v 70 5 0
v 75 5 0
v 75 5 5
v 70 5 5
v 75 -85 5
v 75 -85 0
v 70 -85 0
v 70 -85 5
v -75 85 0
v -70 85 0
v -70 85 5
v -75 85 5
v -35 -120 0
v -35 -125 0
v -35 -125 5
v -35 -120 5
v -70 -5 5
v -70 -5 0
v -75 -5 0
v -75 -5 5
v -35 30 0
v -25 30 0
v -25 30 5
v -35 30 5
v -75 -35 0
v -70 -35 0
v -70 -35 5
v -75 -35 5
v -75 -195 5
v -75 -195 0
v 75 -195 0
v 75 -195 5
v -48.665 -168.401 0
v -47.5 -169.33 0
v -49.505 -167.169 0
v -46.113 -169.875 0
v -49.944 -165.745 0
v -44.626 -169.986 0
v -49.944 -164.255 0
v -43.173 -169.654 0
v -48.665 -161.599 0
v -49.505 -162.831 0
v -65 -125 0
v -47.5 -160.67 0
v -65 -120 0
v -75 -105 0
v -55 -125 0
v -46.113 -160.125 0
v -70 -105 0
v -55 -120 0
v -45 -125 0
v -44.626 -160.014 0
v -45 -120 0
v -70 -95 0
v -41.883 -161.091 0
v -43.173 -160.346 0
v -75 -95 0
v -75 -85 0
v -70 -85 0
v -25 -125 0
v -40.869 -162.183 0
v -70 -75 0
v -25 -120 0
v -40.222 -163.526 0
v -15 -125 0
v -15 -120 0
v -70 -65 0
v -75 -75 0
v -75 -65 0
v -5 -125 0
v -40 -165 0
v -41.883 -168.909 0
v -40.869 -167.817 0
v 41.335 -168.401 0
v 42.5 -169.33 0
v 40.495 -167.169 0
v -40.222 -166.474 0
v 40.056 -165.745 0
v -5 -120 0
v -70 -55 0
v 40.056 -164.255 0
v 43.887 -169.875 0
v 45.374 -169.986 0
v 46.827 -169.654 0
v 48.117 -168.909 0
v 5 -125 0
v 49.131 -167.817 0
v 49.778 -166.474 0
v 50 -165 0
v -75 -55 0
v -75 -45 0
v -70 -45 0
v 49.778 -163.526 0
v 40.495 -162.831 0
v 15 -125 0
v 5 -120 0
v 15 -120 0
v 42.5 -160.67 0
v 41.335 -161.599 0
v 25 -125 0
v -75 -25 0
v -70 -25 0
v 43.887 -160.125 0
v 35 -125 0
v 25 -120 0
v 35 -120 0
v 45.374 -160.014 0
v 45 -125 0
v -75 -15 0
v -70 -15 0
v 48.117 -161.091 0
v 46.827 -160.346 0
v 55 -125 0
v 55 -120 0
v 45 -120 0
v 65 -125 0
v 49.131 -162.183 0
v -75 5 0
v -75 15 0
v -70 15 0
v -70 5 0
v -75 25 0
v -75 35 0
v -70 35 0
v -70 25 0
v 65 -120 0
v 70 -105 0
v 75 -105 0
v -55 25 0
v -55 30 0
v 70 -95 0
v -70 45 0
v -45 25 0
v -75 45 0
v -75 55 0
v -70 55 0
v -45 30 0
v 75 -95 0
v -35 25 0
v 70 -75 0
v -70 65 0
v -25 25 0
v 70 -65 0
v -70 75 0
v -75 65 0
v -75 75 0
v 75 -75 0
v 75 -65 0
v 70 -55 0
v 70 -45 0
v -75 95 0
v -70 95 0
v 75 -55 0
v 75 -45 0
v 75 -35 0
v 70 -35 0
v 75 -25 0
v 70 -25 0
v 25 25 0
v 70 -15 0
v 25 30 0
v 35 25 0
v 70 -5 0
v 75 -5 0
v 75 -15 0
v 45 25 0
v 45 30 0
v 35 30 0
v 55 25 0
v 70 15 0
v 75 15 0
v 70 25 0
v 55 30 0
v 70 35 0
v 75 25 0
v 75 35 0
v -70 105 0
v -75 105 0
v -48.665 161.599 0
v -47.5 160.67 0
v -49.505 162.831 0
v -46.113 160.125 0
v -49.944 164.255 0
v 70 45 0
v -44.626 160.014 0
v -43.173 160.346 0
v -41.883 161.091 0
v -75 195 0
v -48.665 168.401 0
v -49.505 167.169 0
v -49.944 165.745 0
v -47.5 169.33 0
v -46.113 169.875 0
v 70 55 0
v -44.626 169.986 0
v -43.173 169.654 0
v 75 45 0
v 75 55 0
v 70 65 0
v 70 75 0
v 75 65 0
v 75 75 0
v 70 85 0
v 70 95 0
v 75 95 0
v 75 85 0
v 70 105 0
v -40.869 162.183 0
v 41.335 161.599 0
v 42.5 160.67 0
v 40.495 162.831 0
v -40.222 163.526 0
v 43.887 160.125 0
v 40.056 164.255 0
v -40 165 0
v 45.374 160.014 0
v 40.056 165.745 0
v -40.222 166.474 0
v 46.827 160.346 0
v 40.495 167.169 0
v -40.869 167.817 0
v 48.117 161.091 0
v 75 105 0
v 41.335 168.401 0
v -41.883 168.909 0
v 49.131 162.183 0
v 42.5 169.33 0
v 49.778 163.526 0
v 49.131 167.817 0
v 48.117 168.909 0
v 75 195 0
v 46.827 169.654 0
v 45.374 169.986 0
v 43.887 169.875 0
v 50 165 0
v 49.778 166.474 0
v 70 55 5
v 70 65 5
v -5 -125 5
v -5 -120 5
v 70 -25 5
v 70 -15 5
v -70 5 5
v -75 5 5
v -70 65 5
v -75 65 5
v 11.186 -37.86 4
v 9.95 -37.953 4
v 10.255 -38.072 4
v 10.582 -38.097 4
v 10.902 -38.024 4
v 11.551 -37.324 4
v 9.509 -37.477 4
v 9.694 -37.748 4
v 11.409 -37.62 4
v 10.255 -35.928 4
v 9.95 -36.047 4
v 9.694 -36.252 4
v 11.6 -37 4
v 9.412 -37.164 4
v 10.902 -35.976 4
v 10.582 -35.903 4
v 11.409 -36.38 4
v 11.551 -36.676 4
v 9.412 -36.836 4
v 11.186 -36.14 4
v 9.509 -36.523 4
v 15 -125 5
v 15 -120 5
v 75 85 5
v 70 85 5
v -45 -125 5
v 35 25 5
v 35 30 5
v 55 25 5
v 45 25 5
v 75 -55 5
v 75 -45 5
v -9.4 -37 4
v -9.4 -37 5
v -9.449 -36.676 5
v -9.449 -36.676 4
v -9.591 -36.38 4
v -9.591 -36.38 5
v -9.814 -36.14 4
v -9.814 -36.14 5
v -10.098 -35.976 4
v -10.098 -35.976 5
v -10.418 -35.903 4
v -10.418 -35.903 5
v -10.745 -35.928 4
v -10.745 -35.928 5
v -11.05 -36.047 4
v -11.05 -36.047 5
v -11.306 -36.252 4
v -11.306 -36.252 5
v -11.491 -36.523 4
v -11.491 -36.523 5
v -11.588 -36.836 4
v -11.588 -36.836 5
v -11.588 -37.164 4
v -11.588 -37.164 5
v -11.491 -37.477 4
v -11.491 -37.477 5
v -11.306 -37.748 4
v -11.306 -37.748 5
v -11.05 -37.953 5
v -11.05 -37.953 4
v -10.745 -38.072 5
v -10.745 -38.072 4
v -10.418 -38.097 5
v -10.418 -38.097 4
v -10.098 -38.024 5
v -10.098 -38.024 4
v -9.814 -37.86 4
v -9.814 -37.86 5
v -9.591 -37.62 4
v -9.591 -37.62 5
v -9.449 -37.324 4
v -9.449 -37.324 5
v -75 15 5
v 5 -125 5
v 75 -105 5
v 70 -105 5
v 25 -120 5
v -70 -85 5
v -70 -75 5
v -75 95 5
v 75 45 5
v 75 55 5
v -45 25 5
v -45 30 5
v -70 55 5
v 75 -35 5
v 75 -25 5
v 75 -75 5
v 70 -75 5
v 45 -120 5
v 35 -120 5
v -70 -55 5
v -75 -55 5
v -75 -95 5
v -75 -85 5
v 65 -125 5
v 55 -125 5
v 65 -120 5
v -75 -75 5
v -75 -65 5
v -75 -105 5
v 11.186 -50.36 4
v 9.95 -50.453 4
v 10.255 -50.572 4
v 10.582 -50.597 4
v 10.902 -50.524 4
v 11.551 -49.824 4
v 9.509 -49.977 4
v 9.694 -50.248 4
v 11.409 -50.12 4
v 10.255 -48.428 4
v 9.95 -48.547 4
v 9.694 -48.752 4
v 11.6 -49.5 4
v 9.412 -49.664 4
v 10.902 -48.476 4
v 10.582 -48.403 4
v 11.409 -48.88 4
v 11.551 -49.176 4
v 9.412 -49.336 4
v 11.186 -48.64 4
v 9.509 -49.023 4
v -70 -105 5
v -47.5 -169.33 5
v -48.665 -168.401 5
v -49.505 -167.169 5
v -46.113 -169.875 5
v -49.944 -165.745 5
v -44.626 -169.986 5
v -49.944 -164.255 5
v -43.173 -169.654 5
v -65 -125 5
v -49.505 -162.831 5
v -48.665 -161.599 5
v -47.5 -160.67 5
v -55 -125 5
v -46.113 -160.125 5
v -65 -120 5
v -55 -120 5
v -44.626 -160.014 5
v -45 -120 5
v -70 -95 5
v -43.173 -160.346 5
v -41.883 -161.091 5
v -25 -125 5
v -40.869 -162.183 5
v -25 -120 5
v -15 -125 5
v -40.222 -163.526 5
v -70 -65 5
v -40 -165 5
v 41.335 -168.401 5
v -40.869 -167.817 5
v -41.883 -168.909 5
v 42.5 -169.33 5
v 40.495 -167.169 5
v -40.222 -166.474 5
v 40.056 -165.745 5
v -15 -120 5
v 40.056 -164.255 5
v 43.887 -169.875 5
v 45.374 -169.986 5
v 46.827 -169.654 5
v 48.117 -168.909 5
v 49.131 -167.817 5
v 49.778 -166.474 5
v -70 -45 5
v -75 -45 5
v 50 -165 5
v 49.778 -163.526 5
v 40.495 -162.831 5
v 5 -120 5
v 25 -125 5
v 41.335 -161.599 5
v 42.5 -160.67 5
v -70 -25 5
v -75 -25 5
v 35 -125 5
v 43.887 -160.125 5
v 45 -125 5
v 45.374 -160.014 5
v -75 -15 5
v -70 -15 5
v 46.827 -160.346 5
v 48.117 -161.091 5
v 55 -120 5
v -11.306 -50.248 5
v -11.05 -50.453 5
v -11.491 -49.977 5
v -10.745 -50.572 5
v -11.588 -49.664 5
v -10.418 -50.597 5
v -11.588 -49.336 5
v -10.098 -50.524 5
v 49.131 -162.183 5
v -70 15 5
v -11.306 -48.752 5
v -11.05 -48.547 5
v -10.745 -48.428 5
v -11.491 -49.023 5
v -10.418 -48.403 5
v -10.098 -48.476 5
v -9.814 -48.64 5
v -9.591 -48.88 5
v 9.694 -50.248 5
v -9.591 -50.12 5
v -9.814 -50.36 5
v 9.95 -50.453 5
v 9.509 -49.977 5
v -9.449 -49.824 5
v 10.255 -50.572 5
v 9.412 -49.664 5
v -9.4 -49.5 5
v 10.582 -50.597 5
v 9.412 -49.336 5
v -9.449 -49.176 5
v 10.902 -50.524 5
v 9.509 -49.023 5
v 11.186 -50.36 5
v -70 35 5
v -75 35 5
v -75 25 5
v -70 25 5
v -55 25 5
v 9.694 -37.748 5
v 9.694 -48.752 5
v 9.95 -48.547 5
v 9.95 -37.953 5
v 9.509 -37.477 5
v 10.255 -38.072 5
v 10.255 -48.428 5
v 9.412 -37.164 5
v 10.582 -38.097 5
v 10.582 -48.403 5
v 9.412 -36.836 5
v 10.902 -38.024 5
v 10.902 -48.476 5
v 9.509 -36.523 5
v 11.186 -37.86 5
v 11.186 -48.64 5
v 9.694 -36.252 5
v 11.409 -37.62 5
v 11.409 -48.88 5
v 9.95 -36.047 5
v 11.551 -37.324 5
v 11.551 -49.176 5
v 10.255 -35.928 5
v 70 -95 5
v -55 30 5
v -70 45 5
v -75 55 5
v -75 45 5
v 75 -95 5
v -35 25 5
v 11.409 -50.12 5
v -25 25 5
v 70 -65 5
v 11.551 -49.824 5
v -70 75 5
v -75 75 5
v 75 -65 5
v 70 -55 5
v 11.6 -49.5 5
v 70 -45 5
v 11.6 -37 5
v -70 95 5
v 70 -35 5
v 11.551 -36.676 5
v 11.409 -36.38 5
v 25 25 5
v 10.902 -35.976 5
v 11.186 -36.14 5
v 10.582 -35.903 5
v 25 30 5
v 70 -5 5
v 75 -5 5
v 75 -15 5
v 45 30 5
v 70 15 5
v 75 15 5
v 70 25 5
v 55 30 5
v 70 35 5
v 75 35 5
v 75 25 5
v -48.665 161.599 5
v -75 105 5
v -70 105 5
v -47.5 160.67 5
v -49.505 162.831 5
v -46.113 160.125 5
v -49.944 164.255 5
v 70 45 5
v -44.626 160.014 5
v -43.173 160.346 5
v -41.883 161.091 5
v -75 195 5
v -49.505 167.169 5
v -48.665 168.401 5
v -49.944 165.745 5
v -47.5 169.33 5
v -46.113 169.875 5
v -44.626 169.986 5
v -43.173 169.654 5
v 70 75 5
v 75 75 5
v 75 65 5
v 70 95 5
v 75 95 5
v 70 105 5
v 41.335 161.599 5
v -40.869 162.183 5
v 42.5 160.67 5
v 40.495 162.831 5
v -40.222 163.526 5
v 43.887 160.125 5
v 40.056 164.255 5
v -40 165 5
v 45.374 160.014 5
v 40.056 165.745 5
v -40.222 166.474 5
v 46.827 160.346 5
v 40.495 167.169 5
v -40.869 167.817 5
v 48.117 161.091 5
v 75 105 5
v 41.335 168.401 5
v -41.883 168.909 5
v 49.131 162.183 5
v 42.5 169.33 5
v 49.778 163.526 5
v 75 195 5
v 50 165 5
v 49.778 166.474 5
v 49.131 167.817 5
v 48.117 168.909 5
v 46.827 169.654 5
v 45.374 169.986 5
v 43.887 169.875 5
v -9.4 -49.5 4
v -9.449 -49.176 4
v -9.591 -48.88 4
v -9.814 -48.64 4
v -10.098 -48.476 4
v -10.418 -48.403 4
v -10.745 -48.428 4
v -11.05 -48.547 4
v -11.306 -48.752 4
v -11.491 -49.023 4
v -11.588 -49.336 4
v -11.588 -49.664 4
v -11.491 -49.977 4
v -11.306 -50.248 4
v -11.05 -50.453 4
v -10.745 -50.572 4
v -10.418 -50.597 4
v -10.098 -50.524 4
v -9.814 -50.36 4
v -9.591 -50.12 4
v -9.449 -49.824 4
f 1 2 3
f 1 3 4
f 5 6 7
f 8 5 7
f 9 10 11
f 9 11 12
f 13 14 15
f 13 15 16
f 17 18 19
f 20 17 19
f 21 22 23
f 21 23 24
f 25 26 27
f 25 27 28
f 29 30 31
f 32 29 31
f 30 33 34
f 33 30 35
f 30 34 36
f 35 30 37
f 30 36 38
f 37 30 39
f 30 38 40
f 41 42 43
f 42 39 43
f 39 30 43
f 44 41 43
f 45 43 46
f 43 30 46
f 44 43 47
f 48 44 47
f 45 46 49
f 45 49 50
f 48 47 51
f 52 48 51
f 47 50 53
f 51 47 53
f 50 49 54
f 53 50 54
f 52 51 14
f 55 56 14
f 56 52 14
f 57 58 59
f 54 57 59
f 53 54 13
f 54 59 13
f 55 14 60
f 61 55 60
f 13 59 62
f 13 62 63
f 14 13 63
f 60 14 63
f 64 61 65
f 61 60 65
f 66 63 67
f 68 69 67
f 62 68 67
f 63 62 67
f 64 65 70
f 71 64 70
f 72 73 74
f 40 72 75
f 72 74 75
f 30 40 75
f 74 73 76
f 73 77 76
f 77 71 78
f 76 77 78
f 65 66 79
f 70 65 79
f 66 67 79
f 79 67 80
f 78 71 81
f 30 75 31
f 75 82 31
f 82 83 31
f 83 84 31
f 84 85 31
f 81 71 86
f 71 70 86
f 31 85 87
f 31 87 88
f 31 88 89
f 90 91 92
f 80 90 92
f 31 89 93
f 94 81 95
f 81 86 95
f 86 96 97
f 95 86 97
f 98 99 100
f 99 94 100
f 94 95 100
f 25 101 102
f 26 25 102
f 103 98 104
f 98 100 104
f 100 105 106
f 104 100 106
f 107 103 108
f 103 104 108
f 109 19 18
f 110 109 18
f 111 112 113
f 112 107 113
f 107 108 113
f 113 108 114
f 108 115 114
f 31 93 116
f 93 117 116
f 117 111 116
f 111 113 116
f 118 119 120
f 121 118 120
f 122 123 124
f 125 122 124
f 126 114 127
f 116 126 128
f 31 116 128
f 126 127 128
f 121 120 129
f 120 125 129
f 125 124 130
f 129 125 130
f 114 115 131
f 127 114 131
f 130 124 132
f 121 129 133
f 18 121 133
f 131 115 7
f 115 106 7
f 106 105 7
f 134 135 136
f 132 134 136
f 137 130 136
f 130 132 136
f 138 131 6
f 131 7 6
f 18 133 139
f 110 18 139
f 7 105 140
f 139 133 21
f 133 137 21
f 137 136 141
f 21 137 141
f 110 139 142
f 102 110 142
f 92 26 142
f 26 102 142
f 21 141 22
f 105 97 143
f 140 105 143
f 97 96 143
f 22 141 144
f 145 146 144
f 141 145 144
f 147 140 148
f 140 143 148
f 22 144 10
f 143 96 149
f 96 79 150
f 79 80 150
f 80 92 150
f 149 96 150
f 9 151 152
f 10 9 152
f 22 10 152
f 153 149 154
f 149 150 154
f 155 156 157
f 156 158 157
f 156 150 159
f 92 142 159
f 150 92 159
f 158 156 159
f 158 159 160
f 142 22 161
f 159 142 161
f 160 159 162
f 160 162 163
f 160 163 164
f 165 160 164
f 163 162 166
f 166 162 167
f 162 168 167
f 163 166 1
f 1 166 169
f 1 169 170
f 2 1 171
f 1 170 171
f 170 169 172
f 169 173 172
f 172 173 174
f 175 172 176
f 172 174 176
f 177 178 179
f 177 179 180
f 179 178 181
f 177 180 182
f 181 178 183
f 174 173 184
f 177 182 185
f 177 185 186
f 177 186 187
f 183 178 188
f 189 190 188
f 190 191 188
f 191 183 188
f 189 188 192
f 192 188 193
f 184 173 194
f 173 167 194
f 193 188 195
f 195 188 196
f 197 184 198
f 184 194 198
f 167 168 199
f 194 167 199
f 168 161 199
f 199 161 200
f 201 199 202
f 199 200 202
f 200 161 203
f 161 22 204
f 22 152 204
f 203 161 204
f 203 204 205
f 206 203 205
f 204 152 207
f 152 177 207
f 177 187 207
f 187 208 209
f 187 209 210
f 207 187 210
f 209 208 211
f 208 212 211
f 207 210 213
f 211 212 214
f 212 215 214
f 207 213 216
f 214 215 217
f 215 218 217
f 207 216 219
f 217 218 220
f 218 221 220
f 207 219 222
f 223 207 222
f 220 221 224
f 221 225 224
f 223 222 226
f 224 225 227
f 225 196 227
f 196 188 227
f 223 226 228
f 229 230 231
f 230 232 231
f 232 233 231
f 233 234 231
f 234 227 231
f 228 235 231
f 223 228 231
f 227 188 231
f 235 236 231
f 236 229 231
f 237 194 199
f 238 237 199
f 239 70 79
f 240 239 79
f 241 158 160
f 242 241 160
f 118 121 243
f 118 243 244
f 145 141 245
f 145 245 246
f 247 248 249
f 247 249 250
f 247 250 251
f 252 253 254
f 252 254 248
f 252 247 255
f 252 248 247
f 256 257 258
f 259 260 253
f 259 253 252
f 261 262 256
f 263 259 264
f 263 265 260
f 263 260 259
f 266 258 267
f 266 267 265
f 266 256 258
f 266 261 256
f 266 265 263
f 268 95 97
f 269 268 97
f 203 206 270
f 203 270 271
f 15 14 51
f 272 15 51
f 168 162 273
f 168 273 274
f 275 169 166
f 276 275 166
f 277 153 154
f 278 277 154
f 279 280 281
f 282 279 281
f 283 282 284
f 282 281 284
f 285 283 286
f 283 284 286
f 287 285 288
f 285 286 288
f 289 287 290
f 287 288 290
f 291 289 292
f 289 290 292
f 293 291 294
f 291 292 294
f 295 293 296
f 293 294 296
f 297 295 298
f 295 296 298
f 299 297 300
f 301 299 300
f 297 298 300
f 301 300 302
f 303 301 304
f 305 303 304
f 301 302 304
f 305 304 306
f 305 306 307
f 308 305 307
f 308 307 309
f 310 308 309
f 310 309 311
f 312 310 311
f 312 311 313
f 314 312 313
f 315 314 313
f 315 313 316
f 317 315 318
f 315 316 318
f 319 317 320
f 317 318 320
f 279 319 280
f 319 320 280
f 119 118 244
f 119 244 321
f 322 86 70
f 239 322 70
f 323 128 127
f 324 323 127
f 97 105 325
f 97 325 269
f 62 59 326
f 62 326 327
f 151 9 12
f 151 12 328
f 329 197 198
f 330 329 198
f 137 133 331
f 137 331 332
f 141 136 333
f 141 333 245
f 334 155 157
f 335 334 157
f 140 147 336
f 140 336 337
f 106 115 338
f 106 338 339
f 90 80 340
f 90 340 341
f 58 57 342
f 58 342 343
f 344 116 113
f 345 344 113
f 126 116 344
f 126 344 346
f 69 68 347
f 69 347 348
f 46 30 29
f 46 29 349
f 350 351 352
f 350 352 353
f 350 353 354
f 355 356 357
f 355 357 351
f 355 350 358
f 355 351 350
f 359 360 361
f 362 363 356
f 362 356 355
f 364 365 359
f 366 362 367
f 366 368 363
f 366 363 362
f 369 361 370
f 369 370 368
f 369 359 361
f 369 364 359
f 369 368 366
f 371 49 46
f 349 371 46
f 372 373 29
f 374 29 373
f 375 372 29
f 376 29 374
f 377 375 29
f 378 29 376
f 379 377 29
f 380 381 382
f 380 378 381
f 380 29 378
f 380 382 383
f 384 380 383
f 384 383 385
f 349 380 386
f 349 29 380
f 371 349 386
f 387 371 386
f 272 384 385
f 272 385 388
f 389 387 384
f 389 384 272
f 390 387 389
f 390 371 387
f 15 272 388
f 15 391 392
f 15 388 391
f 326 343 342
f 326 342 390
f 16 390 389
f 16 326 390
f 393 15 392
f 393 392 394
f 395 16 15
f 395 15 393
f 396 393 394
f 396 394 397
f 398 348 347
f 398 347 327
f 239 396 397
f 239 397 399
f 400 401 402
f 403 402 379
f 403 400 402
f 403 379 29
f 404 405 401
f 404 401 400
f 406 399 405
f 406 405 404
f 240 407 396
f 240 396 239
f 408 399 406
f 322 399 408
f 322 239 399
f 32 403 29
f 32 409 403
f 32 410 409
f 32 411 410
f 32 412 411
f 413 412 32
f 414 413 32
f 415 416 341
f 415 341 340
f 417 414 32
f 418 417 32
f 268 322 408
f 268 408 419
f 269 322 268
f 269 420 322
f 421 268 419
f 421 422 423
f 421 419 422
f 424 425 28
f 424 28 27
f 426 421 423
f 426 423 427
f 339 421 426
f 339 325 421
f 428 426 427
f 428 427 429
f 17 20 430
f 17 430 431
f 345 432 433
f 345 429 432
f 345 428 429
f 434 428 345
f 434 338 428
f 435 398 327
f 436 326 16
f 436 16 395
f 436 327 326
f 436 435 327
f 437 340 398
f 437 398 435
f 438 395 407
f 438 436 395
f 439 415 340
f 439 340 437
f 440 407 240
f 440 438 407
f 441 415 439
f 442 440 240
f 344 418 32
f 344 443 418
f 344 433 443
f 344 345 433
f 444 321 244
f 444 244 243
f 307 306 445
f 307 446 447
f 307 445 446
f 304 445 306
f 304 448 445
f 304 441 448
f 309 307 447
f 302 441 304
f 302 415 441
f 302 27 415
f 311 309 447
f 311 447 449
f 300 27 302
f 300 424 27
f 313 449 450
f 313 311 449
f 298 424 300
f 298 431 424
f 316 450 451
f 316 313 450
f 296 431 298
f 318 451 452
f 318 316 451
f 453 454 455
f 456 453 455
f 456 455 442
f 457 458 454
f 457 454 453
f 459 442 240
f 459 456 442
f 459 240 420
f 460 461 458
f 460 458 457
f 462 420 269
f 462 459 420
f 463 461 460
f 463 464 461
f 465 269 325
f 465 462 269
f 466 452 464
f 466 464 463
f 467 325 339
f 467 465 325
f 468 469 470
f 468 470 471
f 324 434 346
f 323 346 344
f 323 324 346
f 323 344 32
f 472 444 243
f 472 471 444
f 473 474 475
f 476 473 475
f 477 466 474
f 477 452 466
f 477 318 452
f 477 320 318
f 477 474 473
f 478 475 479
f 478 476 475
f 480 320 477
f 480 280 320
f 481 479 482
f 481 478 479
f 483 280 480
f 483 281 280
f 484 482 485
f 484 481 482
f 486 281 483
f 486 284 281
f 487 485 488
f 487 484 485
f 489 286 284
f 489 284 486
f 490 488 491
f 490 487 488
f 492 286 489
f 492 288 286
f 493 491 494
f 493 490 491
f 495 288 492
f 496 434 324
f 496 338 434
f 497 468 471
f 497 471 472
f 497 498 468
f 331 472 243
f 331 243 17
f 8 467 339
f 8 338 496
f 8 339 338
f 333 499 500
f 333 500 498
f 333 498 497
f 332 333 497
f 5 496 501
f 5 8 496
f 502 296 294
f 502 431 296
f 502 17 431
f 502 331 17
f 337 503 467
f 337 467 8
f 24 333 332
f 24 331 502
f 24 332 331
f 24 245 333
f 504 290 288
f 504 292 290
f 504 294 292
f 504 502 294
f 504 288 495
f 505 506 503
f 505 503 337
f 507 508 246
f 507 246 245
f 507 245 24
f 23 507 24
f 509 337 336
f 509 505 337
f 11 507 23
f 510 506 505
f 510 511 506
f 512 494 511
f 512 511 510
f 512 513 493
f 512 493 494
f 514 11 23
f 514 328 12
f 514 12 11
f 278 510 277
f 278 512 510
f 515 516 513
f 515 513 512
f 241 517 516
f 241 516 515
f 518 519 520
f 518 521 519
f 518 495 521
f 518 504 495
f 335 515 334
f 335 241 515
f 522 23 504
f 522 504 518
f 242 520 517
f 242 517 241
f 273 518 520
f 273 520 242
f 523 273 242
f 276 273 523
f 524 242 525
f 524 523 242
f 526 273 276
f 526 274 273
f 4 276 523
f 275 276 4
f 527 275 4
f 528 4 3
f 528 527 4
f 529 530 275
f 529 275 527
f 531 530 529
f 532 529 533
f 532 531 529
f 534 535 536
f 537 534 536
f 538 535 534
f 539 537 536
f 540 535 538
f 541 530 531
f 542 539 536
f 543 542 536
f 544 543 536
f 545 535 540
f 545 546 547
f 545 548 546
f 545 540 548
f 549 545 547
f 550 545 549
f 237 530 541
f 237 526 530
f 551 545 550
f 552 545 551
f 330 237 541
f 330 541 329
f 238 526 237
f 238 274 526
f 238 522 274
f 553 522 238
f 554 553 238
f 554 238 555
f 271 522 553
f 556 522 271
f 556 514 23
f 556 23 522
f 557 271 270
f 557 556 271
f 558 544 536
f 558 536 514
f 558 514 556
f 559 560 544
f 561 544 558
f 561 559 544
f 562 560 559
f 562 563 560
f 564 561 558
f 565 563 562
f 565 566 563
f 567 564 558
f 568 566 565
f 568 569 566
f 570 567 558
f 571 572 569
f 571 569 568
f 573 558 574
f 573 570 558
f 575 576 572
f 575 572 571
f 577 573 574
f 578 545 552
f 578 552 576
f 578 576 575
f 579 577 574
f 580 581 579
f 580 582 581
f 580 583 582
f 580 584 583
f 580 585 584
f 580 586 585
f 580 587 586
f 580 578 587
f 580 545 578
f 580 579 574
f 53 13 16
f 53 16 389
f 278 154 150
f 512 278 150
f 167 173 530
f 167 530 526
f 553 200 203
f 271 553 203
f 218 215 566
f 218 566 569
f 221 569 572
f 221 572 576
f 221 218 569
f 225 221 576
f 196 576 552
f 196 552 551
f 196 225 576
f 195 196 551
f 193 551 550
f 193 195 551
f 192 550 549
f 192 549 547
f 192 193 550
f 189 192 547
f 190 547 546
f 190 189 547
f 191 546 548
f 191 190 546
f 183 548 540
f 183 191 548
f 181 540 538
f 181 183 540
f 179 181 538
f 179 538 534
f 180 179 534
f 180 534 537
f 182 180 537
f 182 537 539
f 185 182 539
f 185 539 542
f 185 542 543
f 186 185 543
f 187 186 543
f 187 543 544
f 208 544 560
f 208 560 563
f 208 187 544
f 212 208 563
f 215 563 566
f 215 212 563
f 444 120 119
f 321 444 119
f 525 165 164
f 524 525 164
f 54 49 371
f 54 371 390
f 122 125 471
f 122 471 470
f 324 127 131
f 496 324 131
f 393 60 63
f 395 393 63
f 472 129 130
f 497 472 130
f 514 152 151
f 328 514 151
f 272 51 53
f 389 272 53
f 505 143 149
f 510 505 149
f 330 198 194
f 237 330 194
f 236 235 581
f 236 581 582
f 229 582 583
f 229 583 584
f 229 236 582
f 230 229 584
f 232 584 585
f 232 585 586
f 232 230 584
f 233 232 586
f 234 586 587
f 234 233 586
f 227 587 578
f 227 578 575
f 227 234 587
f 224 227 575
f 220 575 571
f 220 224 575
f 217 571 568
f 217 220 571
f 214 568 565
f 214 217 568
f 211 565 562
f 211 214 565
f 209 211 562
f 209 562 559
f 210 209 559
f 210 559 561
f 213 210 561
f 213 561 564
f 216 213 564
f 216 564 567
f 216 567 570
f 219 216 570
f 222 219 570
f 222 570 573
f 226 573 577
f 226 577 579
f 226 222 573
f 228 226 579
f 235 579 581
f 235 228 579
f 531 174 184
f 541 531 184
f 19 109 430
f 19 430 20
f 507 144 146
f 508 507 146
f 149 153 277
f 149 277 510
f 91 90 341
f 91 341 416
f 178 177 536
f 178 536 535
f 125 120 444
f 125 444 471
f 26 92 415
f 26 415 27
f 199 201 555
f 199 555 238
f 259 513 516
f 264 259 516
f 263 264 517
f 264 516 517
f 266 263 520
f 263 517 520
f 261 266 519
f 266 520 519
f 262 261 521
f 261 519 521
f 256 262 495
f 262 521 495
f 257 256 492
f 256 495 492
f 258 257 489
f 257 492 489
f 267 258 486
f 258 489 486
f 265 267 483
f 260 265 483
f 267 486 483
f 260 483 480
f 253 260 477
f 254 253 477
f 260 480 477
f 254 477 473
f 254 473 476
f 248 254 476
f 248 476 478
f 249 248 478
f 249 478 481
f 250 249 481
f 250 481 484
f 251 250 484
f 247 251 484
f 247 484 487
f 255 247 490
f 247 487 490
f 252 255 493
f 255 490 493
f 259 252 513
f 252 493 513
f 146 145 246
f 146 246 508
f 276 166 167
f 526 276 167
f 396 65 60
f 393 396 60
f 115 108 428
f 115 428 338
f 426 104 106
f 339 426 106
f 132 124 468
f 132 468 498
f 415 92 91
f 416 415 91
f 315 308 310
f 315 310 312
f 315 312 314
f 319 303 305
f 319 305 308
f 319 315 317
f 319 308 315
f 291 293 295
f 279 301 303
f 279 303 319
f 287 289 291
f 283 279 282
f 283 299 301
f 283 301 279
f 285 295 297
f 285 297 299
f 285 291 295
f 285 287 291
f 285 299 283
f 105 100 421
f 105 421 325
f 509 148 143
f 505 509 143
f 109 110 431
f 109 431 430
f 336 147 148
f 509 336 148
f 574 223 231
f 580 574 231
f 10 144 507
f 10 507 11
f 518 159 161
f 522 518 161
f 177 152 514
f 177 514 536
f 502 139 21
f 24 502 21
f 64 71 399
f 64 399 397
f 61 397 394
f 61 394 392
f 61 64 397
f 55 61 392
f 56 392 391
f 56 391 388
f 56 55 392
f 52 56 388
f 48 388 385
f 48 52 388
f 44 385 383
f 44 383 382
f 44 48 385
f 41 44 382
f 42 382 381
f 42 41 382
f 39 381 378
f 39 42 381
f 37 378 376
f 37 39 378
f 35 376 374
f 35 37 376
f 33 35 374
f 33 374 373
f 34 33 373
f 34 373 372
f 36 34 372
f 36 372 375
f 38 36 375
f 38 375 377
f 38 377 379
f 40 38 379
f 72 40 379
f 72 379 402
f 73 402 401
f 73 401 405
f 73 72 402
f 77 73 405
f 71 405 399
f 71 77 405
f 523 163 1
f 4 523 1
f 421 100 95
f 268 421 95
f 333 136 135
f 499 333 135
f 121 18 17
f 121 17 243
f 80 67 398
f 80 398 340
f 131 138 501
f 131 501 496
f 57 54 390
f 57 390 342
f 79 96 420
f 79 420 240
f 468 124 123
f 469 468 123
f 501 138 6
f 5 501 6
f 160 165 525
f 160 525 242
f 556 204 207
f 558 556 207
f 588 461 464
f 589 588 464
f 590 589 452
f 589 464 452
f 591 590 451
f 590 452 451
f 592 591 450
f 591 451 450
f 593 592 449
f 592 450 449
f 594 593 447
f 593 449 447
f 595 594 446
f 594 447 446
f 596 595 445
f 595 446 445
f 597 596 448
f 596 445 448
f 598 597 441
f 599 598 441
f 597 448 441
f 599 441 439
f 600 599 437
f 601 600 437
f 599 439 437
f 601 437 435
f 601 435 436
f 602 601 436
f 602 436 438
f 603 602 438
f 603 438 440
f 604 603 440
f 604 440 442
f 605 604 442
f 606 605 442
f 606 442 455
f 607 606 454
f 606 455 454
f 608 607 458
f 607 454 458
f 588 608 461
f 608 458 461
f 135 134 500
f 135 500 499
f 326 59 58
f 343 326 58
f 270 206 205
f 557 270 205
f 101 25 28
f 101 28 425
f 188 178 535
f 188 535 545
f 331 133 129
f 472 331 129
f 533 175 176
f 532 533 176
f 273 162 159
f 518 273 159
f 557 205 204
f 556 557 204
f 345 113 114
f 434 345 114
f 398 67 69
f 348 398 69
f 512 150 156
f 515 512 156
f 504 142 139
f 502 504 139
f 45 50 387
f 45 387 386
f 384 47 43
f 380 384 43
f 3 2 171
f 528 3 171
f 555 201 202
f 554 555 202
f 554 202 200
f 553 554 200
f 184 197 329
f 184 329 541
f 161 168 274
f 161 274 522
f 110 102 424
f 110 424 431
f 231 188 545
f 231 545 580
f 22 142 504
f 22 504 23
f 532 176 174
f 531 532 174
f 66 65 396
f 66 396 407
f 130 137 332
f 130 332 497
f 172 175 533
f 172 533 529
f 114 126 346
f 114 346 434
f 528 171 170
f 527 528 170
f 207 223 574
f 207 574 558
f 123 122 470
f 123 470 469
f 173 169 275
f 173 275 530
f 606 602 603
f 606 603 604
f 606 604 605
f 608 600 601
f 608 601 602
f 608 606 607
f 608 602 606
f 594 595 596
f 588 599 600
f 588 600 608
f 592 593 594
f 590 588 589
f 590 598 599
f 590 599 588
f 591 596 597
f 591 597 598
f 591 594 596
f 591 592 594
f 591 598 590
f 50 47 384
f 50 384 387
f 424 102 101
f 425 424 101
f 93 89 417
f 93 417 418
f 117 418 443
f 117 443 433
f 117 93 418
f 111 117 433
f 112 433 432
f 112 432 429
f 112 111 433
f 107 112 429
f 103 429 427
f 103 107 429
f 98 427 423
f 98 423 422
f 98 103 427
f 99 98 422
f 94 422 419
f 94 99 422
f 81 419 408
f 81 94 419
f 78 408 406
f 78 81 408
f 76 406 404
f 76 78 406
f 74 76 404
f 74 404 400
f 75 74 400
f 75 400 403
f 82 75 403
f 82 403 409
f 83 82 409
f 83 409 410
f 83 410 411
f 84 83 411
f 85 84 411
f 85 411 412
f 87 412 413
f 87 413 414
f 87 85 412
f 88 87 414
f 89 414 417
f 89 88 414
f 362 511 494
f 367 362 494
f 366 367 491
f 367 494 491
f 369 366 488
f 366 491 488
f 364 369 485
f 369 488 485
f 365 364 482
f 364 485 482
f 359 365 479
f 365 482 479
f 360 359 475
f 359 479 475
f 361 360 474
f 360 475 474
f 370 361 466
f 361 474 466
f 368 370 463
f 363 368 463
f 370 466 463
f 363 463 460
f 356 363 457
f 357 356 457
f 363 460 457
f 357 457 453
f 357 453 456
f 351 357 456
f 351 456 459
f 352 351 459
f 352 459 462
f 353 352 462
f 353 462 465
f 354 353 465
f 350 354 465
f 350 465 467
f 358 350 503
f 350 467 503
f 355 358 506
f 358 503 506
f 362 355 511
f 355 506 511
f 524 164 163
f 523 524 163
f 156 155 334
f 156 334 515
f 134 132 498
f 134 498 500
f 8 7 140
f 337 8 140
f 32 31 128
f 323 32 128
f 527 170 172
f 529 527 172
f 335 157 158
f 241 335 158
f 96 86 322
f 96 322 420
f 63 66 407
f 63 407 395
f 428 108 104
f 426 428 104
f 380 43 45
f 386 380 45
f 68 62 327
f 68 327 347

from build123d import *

# Parameters (mm, degrees)
CROQUIS1_W              = 150
CROQUIS1_H              = 390
CROQUIS1_R              = 5
SALIENTE_EXTRUIR1_DEPTH = 5
CROQUIS3_W              = 5
CROQUIS3_H              = 10
CROQUIS3_W_2            = 10
CROQUIS3_H_2            = 5
CORTAR_EXTRUIR1_DEPTH   = 10
CROQUIS4_W              = 10
CROQUIS4_H              = 5
CORTAR_EXTRUIR2_DEPTH   = 10
CROQUIS6_R              = 1.1
CORTAR_EXTRUIR7_DEPTH   = 1


with BuildPart() as part:
    # Croquis1 → Saliente-Extruir1 (new body)
    with BuildSketch(Plane.XY):
        Rectangle(CROQUIS1_W, CROQUIS1_H)
        with Locations((-45, 165)):
            Circle(CROQUIS1_R, mode=Mode.SUBTRACT)
        with Locations((45, 165)):
            Circle(CROQUIS1_R, mode=Mode.SUBTRACT)
        with Locations((-45, -165)):
            Circle(CROQUIS1_R, mode=Mode.SUBTRACT)
        with Locations((45, -165)):
            Circle(CROQUIS1_R, mode=Mode.SUBTRACT)
    extrude(amount=SALIENTE_EXTRUIR1_DEPTH)

    # Croquis3 → Cortar-Extruir1 (cut)
    with BuildSketch(Plane(origin=(0, 0, 0), x_dir=(-1, 0, 0), z_dir=(0, 0, -1))):
        with Locations((-72.5, 100)):
            Rectangle(CROQUIS3_W, CROQUIS3_H)
        with Locations((-72.5, 80)):
            Rectangle(CROQUIS3_W, CROQUIS3_H)
        with Locations((-72.5, 60)):
            Rectangle(CROQUIS3_W, CROQUIS3_H)
        with Locations((-72.5, 40)):
            Rectangle(CROQUIS3_W, CROQUIS3_H)
        with Locations((-72.5, 20)):
            Rectangle(CROQUIS3_W, CROQUIS3_H)
        with Locations((-72.5, 0)):
            Rectangle(CROQUIS3_W, CROQUIS3_H)
        with Locations((-72.5, -20)):
            Rectangle(CROQUIS3_W, CROQUIS3_H)
        with Locations((-72.5, -40)):
            Rectangle(CROQUIS3_W, CROQUIS3_H)
        with Locations((-72.5, -60)):
            Rectangle(CROQUIS3_W, CROQUIS3_H)
        with Locations((-72.5, -80)):
            Rectangle(CROQUIS3_W, CROQUIS3_H)
        with Locations((-72.5, -100)):
            Rectangle(CROQUIS3_W, CROQUIS3_H)
        with Locations((72.5, -100)):
            Rectangle(CROQUIS3_W, CROQUIS3_H)
        with Locations((72.5, -80)):
            Rectangle(CROQUIS3_W, CROQUIS3_H)
        with Locations((72.5, -60)):
            Rectangle(CROQUIS3_W, CROQUIS3_H)
        with Locations((72.5, -40)):
            Rectangle(CROQUIS3_W, CROQUIS3_H)
        with Locations((72.5, -20)):
            Rectangle(CROQUIS3_W, CROQUIS3_H)
        with Locations((72.5, 0)):
            Rectangle(CROQUIS3_W, CROQUIS3_H)
        with Locations((72.5, 20)):
            Rectangle(CROQUIS3_W, CROQUIS3_H)
        with Locations((72.5, 40)):
            Rectangle(CROQUIS3_W, CROQUIS3_H)
        with Locations((72.5, 60)):
            Rectangle(CROQUIS3_W, CROQUIS3_H)
        with Locations((72.5, 80)):
            Rectangle(CROQUIS3_W, CROQUIS3_H)
        with Locations((72.5, 100)):
            Rectangle(CROQUIS3_W, CROQUIS3_H)
        with Locations((-40, -122.5)):
            Rectangle(CROQUIS3_W_2, CROQUIS3_H_2)
        with Locations((-60, -122.5)):
            Rectangle(CROQUIS3_W_2, CROQUIS3_H_2)
        with Locations((-20, -122.5)):
            Rectangle(CROQUIS3_W_2, CROQUIS3_H_2)
        with Locations((0, -122.5)):
            Rectangle(CROQUIS3_W_2, CROQUIS3_H_2)
        with Locations((20, -122.5)):
            Rectangle(CROQUIS3_W_2, CROQUIS3_H_2)
        with Locations((40, -122.5)):
            Rectangle(CROQUIS3_W_2, CROQUIS3_H_2)
        with Locations((60, -122.5)):
            Rectangle(CROQUIS3_W_2, CROQUIS3_H_2)
    extrude(amount=-CORTAR_EXTRUIR1_DEPTH, mode=Mode.SUBTRACT)

    # Croquis4 → Cortar-Extruir2 (cut)
    with BuildSketch(Plane(origin=(0, 0, 0), x_dir=(-1, 0, 0), z_dir=(0, 0, -1))):
        with Locations((-50, 27.5)):
            Rectangle(CROQUIS4_W, CROQUIS4_H)
        with Locations((-30, 27.5)):
            Rectangle(CROQUIS4_W, CROQUIS4_H)
        with Locations((30, 27.5)):
            Rectangle(CROQUIS4_W, CROQUIS4_H)
        with Locations((50, 27.5)):
            Rectangle(CROQUIS4_W, CROQUIS4_H)
    extrude(amount=-CORTAR_EXTRUIR2_DEPTH, mode=Mode.SUBTRACT)

    # Croquis6 → Cortar-Extruir7 (cut)
    with BuildSketch(Plane.XY.offset(5)):
        with Locations((-10.5, -37)):
            Circle(CROQUIS6_R)
        with Locations((10.5, -37)):
            Circle(CROQUIS6_R)
        with Locations((10.5, -49.5)):
            Circle(CROQUIS6_R)
        with Locations((-10.5, -49.5)):
            Circle(CROQUIS6_R)
    extrude(amount=-CORTAR_EXTRUIR7_DEPTH, mode=Mode.SUBTRACT)


solid = part.part
